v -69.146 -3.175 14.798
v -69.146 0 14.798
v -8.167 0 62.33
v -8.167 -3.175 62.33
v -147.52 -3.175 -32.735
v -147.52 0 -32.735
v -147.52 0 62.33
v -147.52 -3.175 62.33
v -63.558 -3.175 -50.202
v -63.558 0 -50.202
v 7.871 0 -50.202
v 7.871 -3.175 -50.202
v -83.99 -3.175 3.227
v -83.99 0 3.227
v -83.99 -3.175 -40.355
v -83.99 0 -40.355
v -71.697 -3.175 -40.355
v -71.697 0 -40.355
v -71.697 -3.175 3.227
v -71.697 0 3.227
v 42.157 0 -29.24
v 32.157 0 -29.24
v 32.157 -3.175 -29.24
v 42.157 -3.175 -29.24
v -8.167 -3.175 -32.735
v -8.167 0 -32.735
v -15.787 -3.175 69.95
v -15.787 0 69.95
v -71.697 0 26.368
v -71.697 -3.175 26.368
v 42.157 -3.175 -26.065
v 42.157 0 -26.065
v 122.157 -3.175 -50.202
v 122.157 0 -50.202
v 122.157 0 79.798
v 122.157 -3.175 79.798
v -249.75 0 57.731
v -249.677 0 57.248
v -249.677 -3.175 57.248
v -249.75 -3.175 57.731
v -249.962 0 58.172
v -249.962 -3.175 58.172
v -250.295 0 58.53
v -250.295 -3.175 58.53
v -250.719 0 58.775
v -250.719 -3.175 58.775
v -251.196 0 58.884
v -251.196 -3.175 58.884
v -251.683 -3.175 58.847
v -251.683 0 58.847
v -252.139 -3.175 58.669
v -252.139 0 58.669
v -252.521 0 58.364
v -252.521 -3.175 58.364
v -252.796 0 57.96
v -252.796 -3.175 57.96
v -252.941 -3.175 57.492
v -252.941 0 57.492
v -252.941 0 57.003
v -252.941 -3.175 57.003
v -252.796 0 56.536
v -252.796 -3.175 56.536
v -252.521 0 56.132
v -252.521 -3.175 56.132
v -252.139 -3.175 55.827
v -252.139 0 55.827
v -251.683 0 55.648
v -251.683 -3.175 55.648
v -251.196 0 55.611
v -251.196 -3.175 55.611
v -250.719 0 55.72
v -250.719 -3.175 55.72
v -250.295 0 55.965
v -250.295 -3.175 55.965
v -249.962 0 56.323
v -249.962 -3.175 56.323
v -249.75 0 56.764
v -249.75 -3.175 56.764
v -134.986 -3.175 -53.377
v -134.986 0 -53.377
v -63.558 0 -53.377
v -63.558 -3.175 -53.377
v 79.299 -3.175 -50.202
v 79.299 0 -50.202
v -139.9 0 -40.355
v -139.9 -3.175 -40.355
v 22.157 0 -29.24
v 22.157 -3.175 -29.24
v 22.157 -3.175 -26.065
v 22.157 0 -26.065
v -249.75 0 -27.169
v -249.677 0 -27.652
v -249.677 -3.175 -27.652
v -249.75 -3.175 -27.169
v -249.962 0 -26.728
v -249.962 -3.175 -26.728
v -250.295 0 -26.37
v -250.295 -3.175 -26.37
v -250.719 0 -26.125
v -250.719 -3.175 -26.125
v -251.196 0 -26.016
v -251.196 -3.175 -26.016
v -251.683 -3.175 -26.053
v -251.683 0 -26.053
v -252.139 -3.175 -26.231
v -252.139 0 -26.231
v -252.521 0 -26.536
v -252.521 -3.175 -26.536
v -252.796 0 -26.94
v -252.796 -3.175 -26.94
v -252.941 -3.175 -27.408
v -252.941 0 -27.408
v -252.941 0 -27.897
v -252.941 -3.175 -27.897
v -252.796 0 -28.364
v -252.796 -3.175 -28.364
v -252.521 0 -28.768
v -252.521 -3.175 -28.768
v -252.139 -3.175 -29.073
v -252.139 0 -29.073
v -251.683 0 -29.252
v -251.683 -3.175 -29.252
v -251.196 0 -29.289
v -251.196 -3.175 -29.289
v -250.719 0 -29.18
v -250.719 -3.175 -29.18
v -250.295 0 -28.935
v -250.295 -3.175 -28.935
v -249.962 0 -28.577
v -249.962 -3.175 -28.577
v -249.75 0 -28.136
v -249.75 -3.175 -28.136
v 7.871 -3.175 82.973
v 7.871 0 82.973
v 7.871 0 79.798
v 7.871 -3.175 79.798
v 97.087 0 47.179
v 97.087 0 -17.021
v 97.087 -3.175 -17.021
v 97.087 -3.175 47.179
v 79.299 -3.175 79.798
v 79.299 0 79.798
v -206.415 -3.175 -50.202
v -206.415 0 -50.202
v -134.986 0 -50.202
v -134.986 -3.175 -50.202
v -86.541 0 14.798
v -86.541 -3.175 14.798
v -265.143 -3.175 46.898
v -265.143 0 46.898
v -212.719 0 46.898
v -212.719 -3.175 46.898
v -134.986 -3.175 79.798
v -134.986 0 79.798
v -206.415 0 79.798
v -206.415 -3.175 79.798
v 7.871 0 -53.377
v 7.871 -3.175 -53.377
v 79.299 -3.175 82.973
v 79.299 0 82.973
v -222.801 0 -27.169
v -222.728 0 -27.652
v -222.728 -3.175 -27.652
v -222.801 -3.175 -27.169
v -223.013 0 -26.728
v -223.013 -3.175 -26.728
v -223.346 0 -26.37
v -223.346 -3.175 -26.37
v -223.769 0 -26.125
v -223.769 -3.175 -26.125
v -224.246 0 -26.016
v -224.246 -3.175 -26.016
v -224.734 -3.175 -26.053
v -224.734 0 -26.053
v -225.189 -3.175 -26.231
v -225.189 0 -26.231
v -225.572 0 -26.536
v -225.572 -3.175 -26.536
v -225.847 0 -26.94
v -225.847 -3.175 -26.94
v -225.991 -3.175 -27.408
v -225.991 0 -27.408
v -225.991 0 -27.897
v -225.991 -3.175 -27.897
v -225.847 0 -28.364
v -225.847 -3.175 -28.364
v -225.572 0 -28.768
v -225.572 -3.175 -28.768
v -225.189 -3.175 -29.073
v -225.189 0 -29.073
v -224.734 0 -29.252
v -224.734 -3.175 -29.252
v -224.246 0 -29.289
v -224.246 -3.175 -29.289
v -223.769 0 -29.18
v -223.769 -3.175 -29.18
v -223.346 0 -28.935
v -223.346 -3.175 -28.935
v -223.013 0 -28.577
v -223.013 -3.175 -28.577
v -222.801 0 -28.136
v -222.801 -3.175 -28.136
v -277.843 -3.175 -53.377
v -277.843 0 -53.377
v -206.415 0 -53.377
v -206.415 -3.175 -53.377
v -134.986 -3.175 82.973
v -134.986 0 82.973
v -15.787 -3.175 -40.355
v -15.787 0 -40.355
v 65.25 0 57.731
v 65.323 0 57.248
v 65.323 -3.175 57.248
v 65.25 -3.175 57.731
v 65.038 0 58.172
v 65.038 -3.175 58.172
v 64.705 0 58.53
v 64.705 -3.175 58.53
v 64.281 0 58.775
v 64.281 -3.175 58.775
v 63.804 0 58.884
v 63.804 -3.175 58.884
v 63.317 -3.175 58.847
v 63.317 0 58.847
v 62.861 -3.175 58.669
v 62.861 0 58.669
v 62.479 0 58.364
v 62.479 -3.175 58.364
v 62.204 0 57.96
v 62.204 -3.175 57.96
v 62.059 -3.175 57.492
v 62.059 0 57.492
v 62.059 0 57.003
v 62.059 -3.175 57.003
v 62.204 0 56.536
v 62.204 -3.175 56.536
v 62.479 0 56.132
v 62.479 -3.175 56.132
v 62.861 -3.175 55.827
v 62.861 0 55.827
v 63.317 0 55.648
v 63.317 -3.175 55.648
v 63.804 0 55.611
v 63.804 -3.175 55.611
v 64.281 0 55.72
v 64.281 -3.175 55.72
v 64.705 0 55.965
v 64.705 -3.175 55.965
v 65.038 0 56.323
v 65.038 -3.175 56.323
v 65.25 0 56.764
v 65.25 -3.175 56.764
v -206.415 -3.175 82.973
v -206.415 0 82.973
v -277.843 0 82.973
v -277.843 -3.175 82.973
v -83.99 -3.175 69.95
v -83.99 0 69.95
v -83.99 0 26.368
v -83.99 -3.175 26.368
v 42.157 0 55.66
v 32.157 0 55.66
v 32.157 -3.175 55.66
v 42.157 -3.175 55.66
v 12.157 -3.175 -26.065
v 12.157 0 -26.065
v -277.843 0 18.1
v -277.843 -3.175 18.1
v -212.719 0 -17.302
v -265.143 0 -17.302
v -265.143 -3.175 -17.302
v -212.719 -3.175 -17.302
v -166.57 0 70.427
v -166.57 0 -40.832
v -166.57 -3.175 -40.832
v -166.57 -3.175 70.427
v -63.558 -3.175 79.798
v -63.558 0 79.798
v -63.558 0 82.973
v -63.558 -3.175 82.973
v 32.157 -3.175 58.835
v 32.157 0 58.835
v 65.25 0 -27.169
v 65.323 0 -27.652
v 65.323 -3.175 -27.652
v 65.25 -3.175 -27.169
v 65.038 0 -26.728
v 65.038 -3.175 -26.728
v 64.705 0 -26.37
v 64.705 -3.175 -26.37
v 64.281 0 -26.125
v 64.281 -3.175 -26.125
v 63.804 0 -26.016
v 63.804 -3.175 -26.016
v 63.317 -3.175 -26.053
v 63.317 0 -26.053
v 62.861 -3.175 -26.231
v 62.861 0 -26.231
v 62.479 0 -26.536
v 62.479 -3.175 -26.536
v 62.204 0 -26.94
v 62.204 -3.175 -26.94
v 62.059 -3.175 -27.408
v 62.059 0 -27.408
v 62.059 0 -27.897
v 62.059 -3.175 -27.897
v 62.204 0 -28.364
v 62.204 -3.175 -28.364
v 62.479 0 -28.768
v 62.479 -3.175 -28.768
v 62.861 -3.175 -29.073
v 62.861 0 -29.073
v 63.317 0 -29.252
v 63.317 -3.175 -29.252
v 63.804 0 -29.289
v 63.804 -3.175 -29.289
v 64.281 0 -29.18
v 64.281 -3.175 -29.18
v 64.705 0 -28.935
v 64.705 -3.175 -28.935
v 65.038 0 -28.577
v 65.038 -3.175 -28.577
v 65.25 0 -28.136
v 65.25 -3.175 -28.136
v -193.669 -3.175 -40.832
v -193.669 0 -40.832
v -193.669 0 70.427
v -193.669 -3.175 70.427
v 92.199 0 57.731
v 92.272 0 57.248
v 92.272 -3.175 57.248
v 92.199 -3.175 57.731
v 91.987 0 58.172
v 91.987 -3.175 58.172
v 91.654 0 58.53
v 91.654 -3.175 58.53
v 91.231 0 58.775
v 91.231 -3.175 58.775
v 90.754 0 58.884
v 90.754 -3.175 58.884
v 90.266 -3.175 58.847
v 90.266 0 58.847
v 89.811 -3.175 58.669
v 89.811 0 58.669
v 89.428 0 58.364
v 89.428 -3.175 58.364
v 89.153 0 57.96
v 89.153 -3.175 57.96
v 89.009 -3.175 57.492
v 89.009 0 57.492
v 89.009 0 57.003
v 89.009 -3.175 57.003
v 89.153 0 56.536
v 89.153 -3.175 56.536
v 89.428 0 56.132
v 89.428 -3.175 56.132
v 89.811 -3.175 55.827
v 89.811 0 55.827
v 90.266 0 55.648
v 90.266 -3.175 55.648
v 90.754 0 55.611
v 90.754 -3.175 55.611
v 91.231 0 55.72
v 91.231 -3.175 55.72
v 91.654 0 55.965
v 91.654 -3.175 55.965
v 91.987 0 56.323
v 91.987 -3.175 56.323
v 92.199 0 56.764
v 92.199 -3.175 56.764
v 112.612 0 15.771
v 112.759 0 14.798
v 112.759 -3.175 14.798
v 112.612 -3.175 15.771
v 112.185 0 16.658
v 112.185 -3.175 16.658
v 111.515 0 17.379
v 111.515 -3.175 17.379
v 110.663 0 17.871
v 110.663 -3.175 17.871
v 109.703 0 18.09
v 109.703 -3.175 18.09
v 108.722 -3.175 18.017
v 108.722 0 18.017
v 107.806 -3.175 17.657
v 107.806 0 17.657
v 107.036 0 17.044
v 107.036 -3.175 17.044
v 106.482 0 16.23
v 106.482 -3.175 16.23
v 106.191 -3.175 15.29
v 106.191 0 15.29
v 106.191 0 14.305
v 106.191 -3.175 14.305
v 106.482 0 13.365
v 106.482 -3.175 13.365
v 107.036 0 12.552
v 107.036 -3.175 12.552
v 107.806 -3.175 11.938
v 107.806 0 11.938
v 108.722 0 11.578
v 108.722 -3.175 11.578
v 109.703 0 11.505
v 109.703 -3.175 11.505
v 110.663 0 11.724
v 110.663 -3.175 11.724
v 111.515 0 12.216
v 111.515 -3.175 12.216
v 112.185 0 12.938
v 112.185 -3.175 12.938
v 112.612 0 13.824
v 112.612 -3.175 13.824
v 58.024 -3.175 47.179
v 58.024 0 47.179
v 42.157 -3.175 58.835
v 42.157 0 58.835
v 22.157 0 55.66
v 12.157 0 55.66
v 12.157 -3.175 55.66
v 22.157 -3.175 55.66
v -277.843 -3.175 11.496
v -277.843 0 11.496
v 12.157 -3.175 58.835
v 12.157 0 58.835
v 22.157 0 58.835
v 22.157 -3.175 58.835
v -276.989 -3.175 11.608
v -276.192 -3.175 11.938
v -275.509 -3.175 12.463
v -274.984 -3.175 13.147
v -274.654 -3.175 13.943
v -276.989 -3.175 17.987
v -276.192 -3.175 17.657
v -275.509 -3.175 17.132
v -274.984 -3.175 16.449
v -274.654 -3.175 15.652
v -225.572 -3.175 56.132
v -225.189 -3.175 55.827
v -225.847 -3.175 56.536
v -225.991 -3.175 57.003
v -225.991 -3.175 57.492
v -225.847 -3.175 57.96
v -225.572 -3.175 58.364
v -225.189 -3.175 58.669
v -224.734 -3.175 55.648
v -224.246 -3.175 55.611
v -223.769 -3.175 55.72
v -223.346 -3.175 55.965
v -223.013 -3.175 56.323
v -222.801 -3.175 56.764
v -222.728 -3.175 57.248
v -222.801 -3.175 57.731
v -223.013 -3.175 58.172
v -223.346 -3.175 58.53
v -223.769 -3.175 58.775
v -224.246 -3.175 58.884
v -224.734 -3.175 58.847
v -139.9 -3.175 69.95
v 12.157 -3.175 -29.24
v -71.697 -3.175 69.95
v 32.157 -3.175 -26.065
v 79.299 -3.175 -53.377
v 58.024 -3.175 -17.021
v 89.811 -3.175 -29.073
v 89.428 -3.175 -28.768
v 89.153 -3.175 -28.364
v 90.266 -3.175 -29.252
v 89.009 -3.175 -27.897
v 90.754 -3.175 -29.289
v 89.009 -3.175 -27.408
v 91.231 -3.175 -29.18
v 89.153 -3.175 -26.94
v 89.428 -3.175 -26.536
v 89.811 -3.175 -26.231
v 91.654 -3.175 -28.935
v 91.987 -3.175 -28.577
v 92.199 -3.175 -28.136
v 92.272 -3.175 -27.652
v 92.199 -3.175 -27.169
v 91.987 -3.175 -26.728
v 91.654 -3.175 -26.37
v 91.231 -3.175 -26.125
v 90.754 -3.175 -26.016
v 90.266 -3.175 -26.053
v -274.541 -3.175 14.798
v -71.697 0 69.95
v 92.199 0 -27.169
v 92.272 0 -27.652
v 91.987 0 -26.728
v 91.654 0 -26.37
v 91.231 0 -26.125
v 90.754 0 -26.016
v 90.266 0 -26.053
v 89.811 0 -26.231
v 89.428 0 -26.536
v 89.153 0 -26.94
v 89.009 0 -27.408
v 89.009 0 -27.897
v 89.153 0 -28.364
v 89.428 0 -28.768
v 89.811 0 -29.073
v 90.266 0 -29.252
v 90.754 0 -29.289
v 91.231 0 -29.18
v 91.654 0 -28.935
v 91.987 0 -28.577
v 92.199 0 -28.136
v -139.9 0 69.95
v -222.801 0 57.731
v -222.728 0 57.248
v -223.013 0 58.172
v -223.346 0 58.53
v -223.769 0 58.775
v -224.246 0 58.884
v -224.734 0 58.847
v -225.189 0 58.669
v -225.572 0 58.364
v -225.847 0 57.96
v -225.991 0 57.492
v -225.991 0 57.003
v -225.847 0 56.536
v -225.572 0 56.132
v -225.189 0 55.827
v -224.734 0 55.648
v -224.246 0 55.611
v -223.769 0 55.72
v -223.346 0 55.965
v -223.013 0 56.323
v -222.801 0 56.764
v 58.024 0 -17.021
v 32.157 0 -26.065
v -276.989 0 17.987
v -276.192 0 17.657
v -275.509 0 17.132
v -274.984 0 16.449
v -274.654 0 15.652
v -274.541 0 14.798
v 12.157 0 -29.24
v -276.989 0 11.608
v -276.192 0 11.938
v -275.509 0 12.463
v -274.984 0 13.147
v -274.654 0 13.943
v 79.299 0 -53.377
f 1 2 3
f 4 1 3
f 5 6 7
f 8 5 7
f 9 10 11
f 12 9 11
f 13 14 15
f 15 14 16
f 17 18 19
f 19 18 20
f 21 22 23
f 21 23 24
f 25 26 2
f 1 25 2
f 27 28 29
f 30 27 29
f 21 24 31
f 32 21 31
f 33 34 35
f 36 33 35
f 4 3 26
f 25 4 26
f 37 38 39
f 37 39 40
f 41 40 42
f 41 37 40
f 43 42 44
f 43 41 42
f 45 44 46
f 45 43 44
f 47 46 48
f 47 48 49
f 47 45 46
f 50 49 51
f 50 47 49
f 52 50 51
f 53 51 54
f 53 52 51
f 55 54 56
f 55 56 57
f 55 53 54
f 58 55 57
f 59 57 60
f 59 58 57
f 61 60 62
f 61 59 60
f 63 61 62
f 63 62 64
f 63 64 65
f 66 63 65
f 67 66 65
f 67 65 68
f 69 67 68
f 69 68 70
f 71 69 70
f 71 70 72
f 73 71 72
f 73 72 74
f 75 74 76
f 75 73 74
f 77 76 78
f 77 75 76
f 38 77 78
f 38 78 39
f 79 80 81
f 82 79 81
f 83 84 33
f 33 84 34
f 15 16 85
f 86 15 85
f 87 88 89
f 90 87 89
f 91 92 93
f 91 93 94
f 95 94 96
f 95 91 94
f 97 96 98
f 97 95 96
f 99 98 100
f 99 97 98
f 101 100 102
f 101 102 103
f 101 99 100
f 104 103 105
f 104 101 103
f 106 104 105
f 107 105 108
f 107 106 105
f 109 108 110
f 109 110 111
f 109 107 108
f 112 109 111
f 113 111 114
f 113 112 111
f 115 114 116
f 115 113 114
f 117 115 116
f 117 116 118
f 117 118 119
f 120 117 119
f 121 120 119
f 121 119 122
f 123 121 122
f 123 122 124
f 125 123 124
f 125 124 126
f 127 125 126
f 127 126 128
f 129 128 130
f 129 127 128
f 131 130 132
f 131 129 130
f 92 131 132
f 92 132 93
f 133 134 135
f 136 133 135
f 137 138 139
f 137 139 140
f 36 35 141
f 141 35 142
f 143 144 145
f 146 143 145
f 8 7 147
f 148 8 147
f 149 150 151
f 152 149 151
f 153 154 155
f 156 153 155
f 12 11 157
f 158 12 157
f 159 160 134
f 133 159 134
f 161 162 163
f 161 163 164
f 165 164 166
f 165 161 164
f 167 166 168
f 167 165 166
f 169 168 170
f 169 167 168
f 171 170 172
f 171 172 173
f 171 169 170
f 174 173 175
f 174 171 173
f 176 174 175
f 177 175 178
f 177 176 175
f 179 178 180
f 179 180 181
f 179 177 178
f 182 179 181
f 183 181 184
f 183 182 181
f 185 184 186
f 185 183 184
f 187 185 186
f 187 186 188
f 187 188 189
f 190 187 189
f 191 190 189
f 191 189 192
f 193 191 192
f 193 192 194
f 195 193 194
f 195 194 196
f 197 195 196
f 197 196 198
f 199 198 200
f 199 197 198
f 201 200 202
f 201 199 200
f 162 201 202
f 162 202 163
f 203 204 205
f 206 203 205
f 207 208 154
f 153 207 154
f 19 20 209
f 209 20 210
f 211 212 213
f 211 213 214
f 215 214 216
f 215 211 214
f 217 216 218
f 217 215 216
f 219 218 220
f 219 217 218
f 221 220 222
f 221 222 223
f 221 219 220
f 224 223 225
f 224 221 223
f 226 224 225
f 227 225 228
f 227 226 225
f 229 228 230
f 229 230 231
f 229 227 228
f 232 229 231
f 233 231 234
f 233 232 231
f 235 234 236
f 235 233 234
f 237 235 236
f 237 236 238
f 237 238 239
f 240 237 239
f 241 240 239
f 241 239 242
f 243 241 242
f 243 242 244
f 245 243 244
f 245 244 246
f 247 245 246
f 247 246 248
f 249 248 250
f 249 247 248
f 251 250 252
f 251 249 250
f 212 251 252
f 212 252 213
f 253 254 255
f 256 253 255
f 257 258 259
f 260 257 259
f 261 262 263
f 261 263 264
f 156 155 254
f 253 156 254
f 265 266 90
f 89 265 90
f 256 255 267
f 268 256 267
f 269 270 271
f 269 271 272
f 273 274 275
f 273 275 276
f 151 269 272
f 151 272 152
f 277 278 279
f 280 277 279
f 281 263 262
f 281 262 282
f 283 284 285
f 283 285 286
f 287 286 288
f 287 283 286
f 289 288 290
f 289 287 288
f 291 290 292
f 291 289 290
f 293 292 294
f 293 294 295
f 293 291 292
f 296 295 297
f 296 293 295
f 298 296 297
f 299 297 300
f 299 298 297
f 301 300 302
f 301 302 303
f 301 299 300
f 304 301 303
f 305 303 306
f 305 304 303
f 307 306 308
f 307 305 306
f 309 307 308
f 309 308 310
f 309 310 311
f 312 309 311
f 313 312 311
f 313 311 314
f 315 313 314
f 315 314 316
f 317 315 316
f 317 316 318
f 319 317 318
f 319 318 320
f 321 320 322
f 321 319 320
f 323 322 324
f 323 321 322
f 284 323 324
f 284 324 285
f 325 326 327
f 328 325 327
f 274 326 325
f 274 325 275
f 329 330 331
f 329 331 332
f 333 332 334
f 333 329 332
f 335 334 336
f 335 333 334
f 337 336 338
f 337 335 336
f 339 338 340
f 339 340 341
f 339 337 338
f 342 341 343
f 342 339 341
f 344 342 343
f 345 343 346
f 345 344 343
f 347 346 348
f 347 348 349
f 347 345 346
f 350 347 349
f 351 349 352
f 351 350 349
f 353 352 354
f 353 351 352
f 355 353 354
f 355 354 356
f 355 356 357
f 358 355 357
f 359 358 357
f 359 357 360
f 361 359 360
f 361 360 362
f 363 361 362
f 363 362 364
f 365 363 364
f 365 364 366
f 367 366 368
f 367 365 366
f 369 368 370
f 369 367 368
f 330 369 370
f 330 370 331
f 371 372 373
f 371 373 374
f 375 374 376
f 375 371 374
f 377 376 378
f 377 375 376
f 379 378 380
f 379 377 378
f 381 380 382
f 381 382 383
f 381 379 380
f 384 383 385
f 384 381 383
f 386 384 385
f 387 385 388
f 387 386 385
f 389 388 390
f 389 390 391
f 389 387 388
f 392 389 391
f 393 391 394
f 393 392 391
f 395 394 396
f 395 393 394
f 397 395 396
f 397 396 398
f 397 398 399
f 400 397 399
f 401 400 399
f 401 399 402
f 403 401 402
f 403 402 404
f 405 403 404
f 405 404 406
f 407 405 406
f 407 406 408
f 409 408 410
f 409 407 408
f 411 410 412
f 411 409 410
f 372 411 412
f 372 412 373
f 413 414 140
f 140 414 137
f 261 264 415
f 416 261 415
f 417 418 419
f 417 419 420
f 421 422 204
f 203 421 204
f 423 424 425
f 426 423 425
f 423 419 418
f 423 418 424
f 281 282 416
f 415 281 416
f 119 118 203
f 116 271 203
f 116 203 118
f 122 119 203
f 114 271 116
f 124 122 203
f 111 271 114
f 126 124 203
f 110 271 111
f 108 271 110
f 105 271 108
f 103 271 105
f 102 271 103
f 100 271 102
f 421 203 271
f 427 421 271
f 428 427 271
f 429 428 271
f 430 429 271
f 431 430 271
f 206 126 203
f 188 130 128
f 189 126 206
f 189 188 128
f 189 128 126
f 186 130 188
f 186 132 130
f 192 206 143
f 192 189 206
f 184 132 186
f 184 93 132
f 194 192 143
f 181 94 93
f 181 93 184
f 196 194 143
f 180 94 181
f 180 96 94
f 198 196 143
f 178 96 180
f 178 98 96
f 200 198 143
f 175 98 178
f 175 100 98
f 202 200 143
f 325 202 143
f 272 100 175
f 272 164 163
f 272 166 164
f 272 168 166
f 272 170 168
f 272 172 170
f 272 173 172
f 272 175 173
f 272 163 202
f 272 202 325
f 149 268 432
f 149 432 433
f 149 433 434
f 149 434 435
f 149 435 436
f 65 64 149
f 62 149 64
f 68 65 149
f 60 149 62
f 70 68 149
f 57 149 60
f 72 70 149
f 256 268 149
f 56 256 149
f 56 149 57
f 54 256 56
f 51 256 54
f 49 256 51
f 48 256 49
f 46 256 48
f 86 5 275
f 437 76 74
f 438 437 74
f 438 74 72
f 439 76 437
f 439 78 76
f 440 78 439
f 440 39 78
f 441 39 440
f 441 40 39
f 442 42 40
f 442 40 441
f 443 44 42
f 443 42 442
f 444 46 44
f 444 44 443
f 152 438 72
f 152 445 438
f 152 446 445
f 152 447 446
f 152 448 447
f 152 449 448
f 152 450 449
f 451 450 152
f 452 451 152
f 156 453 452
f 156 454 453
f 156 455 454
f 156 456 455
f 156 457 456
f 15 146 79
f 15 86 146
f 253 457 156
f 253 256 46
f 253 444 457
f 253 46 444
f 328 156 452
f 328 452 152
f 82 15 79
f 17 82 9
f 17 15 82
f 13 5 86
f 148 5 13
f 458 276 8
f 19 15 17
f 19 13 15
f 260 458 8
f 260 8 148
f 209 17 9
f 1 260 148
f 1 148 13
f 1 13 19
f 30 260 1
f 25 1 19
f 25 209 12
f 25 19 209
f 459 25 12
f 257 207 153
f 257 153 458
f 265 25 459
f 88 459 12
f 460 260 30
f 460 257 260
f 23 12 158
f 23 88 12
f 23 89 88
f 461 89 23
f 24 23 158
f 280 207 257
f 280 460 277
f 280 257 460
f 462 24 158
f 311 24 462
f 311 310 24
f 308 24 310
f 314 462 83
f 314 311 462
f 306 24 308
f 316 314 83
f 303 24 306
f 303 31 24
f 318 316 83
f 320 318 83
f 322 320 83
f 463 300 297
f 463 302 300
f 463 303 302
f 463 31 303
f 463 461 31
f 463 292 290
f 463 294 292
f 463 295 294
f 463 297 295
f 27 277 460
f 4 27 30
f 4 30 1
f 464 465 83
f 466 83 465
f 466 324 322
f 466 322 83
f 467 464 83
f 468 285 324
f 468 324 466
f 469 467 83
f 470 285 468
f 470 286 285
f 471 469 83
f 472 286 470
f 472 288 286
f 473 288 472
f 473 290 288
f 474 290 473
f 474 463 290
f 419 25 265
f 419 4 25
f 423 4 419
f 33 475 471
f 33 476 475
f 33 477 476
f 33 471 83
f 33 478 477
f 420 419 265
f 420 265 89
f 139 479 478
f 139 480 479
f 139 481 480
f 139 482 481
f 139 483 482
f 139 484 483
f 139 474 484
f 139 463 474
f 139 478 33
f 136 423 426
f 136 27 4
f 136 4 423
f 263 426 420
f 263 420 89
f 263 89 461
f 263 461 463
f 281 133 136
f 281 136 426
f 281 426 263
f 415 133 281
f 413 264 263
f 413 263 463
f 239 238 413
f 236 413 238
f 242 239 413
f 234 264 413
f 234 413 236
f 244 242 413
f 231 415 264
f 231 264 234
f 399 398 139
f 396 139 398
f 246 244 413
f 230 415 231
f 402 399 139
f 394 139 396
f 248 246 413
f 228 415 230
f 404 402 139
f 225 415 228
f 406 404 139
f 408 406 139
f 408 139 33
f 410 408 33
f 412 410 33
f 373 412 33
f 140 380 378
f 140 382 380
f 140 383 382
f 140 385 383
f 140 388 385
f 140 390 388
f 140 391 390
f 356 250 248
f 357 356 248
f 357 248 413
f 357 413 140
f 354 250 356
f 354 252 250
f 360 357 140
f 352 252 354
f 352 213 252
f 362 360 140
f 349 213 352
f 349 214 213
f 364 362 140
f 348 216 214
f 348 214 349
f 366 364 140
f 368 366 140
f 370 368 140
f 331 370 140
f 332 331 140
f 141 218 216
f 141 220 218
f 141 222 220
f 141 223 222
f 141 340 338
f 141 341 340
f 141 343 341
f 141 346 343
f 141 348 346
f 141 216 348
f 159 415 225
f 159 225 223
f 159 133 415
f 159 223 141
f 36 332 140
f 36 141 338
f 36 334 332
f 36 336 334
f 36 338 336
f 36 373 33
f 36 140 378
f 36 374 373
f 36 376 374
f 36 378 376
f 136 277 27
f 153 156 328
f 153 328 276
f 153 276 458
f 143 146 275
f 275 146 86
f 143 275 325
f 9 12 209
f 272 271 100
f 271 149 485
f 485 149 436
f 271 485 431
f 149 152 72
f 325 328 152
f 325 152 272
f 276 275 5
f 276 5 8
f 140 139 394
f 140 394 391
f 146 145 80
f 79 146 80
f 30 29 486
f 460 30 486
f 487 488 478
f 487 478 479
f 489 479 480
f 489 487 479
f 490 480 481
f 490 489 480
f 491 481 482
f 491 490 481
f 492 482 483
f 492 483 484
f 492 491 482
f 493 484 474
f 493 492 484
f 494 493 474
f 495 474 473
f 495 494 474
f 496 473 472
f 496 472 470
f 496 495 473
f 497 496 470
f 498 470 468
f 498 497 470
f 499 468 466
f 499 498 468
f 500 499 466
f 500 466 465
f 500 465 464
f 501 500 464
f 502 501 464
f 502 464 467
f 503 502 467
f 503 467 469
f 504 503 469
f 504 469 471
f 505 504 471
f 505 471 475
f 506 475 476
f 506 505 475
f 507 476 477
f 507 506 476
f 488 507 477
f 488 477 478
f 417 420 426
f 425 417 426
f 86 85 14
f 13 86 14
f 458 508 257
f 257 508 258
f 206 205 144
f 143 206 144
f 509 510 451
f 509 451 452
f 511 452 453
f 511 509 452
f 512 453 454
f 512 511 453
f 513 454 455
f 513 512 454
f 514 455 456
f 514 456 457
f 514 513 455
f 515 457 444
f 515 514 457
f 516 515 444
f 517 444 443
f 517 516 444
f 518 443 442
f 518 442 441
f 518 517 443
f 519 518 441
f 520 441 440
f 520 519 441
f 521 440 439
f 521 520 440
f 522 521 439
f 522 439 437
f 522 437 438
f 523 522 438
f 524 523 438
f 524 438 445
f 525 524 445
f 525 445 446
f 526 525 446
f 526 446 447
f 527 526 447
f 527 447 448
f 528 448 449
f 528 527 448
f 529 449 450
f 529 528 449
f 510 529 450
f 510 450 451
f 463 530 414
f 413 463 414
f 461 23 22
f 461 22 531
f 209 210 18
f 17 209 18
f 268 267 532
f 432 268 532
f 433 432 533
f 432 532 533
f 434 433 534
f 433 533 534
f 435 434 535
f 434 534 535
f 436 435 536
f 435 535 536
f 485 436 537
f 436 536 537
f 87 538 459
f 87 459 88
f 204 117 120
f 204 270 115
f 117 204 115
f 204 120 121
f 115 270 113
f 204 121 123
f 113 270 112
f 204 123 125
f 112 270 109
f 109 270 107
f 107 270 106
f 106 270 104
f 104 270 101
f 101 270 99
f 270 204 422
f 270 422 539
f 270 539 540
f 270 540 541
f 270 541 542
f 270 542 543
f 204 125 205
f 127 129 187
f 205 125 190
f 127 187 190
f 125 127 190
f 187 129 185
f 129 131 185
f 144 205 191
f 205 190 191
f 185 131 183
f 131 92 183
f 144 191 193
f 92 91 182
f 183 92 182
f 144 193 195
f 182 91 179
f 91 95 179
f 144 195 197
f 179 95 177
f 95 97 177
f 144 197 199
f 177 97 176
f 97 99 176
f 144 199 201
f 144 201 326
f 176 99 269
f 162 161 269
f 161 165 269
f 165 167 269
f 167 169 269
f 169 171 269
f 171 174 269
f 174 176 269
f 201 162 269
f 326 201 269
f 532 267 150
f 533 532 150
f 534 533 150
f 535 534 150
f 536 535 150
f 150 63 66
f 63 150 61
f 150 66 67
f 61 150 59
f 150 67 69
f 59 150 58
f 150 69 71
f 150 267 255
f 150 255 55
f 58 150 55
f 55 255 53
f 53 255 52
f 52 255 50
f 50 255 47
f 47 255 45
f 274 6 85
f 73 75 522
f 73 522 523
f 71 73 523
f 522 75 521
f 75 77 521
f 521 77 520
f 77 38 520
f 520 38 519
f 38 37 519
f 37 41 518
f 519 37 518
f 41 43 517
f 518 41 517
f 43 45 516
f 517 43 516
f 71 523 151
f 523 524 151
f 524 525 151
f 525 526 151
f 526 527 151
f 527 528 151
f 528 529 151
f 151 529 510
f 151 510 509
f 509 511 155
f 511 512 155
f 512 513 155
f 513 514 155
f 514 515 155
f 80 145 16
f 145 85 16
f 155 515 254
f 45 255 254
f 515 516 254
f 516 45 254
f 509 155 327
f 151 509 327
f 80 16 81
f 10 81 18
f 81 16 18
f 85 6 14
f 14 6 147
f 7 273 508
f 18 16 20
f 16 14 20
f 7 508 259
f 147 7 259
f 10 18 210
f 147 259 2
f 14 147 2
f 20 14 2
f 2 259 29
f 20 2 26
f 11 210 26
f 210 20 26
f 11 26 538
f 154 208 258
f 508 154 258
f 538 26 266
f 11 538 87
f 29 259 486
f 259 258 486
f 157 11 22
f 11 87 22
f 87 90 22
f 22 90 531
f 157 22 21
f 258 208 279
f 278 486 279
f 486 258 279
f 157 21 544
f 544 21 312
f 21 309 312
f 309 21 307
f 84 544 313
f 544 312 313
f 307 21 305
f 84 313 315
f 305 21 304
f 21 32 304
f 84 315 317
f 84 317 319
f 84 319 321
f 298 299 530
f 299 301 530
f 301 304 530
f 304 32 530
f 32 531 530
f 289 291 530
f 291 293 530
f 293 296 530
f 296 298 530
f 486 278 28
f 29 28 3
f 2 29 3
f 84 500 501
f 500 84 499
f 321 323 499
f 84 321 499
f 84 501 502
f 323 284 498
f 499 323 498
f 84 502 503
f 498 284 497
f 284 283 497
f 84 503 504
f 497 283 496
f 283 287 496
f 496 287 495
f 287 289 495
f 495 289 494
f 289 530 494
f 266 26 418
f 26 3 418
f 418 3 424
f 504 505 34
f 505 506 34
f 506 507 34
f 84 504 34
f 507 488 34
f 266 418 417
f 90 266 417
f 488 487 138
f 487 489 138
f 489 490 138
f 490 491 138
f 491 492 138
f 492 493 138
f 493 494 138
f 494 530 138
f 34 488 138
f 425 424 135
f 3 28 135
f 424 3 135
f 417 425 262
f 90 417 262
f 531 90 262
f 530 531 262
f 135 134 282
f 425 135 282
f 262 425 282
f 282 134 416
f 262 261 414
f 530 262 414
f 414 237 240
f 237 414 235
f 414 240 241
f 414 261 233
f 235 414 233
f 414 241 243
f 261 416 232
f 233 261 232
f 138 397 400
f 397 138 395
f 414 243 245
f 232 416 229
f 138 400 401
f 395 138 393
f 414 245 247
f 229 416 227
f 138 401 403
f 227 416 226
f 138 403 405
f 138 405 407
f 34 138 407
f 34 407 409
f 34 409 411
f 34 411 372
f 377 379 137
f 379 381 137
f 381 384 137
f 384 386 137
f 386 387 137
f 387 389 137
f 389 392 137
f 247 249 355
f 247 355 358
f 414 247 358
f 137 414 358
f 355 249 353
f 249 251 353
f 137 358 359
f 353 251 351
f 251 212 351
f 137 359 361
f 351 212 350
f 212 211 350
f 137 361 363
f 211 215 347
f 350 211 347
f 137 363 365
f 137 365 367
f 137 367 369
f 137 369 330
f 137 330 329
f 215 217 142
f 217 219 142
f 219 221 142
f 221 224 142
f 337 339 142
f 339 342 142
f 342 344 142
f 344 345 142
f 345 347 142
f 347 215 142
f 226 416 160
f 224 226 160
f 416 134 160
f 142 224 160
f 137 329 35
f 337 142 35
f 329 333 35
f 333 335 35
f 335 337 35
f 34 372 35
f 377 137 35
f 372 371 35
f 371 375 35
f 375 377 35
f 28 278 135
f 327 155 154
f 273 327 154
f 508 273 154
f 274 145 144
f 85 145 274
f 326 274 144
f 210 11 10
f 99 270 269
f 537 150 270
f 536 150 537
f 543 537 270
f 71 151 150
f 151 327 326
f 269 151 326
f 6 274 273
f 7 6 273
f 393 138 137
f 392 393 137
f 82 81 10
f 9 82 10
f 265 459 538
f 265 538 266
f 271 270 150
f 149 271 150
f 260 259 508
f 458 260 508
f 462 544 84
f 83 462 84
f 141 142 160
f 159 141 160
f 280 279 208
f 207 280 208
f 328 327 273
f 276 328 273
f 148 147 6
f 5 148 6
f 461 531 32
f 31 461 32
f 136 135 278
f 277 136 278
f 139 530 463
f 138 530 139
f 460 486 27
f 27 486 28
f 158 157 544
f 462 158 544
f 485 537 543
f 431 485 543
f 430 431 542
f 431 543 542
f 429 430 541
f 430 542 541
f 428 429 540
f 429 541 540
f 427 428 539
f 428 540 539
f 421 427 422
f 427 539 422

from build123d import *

# Parameters (mm, degrees)
F0_R     = 1.64084
F0_W     = 10
F0_H     = 3.175
F0_R_2   = 3.302
F0_W_2   = 52.4243835688
F0_H_2   = 64.2
F0_W_3   = 27.0990398764
F0_H_3   = 111.2592631512
F0_W_4   = 39.0626990616
F1_DEPTH = 3.175


with BuildPart() as f1:
    # F0 (on Front) → F1 (new body)
    with BuildSketch(Plane.XZ):
        with BuildLine():
            Line((79.2994276966, -50.2024036679), (122.1565705538, -50.2024036679))
            Line((122.1565705538, -50.2024036679), (122.1565705538, 79.7975963321))
            Line((122.1565705538, 79.7975963321), (79.2994276966, 79.7975963321))
            Line((79.2994276966, 79.7975963321), (79.2994276966, 82.9725963321))
            Line((79.2994276966, 82.9725963321), (7.870856268, 82.9725963321))
            Line((7.870856268, 82.9725963321), (7.870856268, 79.7975963321))
            Line((7.870856268, 79.7975963321), (-63.5577151605, 79.7975963321))
            Line((-63.5577151605, 79.7975963321), (-63.5577151605, 82.9725963321))
            Line((-63.5577151605, 82.9725963321), (-134.9862865891, 82.9725963321))
            Line((-134.9862865891, 82.9725963321), (-134.9862865891, 79.7975963321))
            Line((-134.9862865891, 79.7975963321), (-206.4148580177, 79.7975963321))
            Line((-206.4148580177, 79.7975963321), (-206.4148580177, 82.9725963321))
            Line((-206.4148580177, 82.9725963321), (-277.8434294462, 82.9725963321))
            Line((-277.8434294462, 82.9725963321), (-277.8434294462, 79.7975963321))
            Line((-277.8434294462, 79.7975963321), (-277.8434294462, 18.0995963321))
            ThreePointArc((-277.8434294462, 18.0995963321), (-275.5085628548, 17.1324629236), (-274.5414294462, 14.7975963321))
            ThreePointArc((-274.5414294462, 14.7975963321), (-275.5085628548, 12.4627297406), (-277.8434294462, 11.4955963321))
            Line((-277.8434294462, 11.4955963321), (-277.8434294462, -50.2024036679))
            Line((-277.8434294462, -50.2024036679), (-277.8434294462, -53.3774036679))
            Line((-277.8434294462, -53.3774036679), (-206.4148580177, -53.3774036679))
            Line((-206.4148580177, -53.3774036679), (-206.4148580177, -50.2024036679))
            Line((-206.4148580177, -50.2024036679), (-134.9862865891, -50.2024036679))
            Line((-134.9862865891, -50.2024036679), (-134.9862865891, -53.3774036679))
            Line((-134.9862865891, -53.3774036679), (-63.5577151605, -53.3774036679))
            Line((-63.5577151605, -53.3774036679), (-63.5577151605, -50.2024036679))
            Line((-63.5577151605, -50.2024036679), (7.870856268, -50.2024036679))
            Line((7.870856268, -50.2024036679), (7.870856268, -53.3774036679))
            Line((7.870856268, -53.3774036679), (79.2994276966, -53.3774036679))
            Line((79.2994276966, -53.3774036679), (79.2994276966, -50.2024036679))
        make_face()
        with Locations((-251.3181294462, -27.6524106679)):
            Circle(F0_R, mode=Mode.SUBTRACT)
        with Locations((-224.3687294462, -27.6524106679)):
            Circle(F0_R, mode=Mode.SUBTRACT)
        with Locations((17.1565705538, -27.6524036679)):
            Rectangle(F0_W, F0_H, mode=Mode.SUBTRACT)
        with Locations((37.1565705538, -27.6524036679)):
            Rectangle(F0_W, F0_H, mode=Mode.SUBTRACT)
        with Locations((63.6818705538, -27.6524106672)):
            Circle(F0_R, mode=Mode.SUBTRACT)
        with Locations((90.6312705538, -27.6524106672)):
            Circle(F0_R, mode=Mode.SUBTRACT)
        Polygon((-8.1668528914, -32.7346504676), (-8.1668528914, -40.3546504676), (-15.7868528914, -40.3546504676), (-71.6971936822, -40.3546504676), (-83.9896652103, -40.3546504676), (-139.900006001, -40.3546504676), (-147.520006001, -40.3546504676), (-147.520006001, -32.7346504676), (-147.520006001, 62.3298431318), (-147.520006001, 69.9498431318), (-139.900006001, 69.9498431318), (-83.9896652103, 69.9498431318), (-71.6971936822, 69.9498431318), (-15.7868528915, 69.9498431318), (-8.1668528914, 69.9498431318), (-8.1668528914, 62.3298431318), align=None, mode=Mode.SUBTRACT)
        with Locations((109.4565705538, 14.7975963321)):
            Circle(F0_R_2, mode=Mode.SUBTRACT)
        with Locations((-238.9312376618, 14.7975963321)):
            Rectangle(F0_W_2, F0_H_2, mode=Mode.SUBTRACT)
        with Locations((-180.1195259392, 14.7975963321)):
            Rectangle(F0_W_3, F0_H_3, mode=Mode.SUBTRACT)
        with Locations((-251.3181294462, 57.2475963321)):
            Circle(F0_R, mode=Mode.SUBTRACT)
        with Locations((-224.3687294462, 57.2475963321)):
            Circle(F0_R, mode=Mode.SUBTRACT)
        with Locations((77.5555704206, 15.0792245534)):
            Rectangle(F0_W_4, F0_H_2, mode=Mode.SUBTRACT)
        with Locations((17.1565705538, 57.2475963321)):
            Rectangle(F0_W, F0_H, mode=Mode.SUBTRACT)
        with Locations((37.1565705538, 57.2475963321)):
            Rectangle(F0_W, F0_H, mode=Mode.SUBTRACT)
        with Locations((63.6818705538, 57.2475963321)):
            Circle(F0_R, mode=Mode.SUBTRACT)
        with Locations((90.6312705538, 57.2475963321)):
            Circle(F0_R, mode=Mode.SUBTRACT)
        Polygon((-147.520006001, 62.3298431318), (-86.5412493668, 14.7975963321), (-83.9896652103, 16.7865271426), (-83.9896652103, 26.3683687987), (-139.900006001, 69.9498431318), (-147.520006001, 69.9498431318), align=None)
        Polygon((-69.1456095257, 14.7975963321), (-8.1668528915, 62.3298431318), (-8.1668528914, 69.9498431318), (-15.7868528915, 69.9498431318), (-71.6971936822, 26.3683687987), (-71.6971936822, 16.7865271426), align=None)
        Polygon((-15.7868528914, -40.3546504676), (-8.1668528914, -40.3546504676), (-8.1668528914, -32.7346504676), (-69.1456095257, 14.7975963321), (-71.6971936822, 12.8086655216), (-71.6971936822, 3.2268238655), align=None)
        Polygon((-147.520006001, -40.3546504676), (-139.900006001, -40.3546504676), (-83.9896652103, 3.2268238655), (-83.9896652103, 12.8086655216), (-86.5412493668, 14.7975963321), (-147.520006001, -32.7346504676), align=None)
        Polygon((-83.9896652103, -40.3546504676), (-71.6971936822, -40.3546504676), (-71.6971936822, 3.2268238655), (-77.8434294462, 8.0177446936), (-83.9896652103, 3.2268238655), align=None)
        Polygon((-77.8434294462, 8.0177446936), (-71.6971936822, 3.2268238655), (-71.6971936822, 12.8086655216), align=None)
        Polygon((-83.9896652103, 3.2268238655), (-77.8434294462, 8.0177446936), (-83.9896652103, 12.8086655216), align=None)
        Polygon((-86.5412493668, 14.7975963321), (-83.9896652103, 12.8086655216), (-83.9896652103, 16.7865271426), align=None)
        Polygon((-83.9896652103, 12.8086655216), (-77.8434294462, 8.0177446936), (-71.6971936822, 12.8086655216), (-71.6971936822, 16.7865271426), (-77.8434294462, 21.5774479707), (-83.9896652103, 16.7865271426), align=None)
        Polygon((-77.8434294462, 21.5774479707), (-71.6971936822, 16.7865271426), (-71.6971936822, 26.3683687987), align=None)
        Polygon((-83.9896652103, 16.7865271426), (-77.8434294462, 21.5774479707), (-83.9896652103, 26.3683687987), align=None)
        Polygon((-83.9896652103, 26.3683687987), (-77.8434294462, 21.5774479707), (-71.6971936822, 26.3683687987), (-71.6971936822, 69.9498431318), (-83.9896652103, 69.9498431318), align=None)
        Polygon((-71.6971936822, 12.8086655216), (-69.1456095257, 14.7975963321), (-71.6971936822, 16.7865271426), align=None)
    extrude(amount=F1_DEPTH)


solid = f1.part
